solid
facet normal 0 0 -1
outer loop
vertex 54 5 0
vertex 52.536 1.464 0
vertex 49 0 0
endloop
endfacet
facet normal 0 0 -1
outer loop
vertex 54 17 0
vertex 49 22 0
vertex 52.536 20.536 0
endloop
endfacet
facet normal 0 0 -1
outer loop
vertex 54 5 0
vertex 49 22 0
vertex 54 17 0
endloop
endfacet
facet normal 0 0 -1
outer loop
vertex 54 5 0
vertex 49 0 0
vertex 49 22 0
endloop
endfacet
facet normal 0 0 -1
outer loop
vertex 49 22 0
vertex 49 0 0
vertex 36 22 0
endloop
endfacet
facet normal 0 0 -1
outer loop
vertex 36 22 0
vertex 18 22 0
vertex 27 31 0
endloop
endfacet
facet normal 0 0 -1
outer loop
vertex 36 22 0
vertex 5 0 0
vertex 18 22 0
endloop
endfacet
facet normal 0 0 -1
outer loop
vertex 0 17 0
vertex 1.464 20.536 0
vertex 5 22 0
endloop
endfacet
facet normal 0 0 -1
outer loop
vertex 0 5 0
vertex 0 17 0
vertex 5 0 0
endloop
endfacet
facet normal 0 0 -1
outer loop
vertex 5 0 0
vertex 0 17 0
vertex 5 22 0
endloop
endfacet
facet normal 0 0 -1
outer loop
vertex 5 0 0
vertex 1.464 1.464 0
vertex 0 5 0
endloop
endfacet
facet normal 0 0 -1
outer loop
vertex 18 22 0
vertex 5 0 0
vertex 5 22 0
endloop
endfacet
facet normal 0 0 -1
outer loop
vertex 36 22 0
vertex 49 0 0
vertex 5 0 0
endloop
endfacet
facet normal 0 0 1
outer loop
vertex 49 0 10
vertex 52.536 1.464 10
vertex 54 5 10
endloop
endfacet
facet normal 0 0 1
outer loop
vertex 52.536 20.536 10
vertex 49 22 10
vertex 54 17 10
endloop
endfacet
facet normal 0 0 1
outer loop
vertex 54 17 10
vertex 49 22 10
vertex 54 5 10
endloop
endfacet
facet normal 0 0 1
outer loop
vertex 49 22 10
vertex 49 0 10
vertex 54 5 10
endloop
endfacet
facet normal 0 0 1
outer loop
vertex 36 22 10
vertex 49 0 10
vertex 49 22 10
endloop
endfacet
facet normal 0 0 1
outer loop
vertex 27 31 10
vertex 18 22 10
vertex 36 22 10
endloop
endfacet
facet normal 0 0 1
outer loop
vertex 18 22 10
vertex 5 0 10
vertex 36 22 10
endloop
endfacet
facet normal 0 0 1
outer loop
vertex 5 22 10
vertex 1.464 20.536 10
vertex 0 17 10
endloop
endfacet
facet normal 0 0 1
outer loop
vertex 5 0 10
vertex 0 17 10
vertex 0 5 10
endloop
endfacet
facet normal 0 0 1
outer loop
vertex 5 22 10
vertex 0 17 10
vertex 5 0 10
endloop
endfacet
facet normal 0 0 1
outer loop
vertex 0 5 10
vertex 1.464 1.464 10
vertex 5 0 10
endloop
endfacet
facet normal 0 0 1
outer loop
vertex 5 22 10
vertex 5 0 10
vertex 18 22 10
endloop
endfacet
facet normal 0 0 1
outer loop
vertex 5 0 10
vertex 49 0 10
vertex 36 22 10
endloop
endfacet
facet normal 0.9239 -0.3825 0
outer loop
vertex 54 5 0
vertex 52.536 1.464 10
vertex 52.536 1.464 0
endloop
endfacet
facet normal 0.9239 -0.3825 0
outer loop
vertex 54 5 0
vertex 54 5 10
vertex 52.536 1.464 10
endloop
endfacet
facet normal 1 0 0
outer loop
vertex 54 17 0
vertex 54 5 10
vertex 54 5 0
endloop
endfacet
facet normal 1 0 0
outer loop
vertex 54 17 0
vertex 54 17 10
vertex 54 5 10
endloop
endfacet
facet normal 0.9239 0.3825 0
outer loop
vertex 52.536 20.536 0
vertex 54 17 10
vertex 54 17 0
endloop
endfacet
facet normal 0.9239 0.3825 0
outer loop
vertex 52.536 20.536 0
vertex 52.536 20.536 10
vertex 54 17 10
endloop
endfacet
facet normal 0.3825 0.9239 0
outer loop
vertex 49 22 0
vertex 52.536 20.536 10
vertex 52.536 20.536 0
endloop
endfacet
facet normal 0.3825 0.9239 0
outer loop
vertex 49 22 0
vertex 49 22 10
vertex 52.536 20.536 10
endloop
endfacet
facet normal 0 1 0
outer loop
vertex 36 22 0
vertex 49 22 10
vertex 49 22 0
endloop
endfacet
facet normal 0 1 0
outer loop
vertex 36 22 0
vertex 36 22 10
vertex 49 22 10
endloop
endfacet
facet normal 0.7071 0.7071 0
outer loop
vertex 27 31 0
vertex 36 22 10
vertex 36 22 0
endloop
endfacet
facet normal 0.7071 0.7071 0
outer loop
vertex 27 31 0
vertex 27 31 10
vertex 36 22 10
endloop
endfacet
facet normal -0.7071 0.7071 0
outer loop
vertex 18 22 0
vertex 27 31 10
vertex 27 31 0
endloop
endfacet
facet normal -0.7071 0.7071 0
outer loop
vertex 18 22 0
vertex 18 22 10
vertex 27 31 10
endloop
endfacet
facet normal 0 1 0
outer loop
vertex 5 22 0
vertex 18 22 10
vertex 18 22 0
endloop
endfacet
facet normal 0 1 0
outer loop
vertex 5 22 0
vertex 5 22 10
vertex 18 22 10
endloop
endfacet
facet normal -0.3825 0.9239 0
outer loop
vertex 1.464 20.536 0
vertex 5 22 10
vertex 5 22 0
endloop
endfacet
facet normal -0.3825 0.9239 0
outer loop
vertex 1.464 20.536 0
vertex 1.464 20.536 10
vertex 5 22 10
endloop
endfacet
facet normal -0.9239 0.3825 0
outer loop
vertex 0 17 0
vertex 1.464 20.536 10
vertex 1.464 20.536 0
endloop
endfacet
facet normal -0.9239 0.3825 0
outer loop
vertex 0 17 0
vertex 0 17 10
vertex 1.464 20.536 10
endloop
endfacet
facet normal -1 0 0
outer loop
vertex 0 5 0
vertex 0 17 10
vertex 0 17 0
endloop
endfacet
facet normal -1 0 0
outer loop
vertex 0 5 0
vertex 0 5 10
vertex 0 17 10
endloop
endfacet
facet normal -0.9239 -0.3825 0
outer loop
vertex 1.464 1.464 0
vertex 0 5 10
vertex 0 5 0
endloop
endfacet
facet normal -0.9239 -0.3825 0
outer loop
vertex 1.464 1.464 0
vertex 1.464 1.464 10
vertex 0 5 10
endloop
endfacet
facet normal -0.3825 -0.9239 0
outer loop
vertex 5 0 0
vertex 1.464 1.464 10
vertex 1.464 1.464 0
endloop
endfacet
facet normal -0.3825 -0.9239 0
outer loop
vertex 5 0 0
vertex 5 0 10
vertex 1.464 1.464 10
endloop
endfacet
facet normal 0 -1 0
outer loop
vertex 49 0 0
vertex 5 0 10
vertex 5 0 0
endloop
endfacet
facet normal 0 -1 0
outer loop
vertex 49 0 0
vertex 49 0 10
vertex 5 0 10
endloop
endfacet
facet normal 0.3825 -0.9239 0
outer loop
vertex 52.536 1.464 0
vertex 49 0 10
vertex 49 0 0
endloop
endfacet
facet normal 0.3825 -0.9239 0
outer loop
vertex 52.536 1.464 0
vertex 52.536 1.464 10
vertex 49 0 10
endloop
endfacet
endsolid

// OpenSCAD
$fn = 32;

// ----------------------------------------------------------------------
// Ratchet pawl: 54 x 22 mm body, beak 9 mm сверху
// ----------------------------------------------------------------------

// --- parameters (mm) ---
profile_height = 10;      // extrusion height
profile_points = 15;      // points of the closed outline

profile = [[0, 5], [1.464, 1.464], [5, 0], [49, 0], [52.536, 1.464], [54, 5], [54, 17], [52.536, 20.536], [49, 22], [36, 22], [27, 31], [18, 22], [5, 22], [1.464, 20.536], [0, 17]];  // single closed polygon, 15 points, counter clockwise

// --- the one profile operation ---
linear_extrude(height = profile_height) polygon(points = profile);
